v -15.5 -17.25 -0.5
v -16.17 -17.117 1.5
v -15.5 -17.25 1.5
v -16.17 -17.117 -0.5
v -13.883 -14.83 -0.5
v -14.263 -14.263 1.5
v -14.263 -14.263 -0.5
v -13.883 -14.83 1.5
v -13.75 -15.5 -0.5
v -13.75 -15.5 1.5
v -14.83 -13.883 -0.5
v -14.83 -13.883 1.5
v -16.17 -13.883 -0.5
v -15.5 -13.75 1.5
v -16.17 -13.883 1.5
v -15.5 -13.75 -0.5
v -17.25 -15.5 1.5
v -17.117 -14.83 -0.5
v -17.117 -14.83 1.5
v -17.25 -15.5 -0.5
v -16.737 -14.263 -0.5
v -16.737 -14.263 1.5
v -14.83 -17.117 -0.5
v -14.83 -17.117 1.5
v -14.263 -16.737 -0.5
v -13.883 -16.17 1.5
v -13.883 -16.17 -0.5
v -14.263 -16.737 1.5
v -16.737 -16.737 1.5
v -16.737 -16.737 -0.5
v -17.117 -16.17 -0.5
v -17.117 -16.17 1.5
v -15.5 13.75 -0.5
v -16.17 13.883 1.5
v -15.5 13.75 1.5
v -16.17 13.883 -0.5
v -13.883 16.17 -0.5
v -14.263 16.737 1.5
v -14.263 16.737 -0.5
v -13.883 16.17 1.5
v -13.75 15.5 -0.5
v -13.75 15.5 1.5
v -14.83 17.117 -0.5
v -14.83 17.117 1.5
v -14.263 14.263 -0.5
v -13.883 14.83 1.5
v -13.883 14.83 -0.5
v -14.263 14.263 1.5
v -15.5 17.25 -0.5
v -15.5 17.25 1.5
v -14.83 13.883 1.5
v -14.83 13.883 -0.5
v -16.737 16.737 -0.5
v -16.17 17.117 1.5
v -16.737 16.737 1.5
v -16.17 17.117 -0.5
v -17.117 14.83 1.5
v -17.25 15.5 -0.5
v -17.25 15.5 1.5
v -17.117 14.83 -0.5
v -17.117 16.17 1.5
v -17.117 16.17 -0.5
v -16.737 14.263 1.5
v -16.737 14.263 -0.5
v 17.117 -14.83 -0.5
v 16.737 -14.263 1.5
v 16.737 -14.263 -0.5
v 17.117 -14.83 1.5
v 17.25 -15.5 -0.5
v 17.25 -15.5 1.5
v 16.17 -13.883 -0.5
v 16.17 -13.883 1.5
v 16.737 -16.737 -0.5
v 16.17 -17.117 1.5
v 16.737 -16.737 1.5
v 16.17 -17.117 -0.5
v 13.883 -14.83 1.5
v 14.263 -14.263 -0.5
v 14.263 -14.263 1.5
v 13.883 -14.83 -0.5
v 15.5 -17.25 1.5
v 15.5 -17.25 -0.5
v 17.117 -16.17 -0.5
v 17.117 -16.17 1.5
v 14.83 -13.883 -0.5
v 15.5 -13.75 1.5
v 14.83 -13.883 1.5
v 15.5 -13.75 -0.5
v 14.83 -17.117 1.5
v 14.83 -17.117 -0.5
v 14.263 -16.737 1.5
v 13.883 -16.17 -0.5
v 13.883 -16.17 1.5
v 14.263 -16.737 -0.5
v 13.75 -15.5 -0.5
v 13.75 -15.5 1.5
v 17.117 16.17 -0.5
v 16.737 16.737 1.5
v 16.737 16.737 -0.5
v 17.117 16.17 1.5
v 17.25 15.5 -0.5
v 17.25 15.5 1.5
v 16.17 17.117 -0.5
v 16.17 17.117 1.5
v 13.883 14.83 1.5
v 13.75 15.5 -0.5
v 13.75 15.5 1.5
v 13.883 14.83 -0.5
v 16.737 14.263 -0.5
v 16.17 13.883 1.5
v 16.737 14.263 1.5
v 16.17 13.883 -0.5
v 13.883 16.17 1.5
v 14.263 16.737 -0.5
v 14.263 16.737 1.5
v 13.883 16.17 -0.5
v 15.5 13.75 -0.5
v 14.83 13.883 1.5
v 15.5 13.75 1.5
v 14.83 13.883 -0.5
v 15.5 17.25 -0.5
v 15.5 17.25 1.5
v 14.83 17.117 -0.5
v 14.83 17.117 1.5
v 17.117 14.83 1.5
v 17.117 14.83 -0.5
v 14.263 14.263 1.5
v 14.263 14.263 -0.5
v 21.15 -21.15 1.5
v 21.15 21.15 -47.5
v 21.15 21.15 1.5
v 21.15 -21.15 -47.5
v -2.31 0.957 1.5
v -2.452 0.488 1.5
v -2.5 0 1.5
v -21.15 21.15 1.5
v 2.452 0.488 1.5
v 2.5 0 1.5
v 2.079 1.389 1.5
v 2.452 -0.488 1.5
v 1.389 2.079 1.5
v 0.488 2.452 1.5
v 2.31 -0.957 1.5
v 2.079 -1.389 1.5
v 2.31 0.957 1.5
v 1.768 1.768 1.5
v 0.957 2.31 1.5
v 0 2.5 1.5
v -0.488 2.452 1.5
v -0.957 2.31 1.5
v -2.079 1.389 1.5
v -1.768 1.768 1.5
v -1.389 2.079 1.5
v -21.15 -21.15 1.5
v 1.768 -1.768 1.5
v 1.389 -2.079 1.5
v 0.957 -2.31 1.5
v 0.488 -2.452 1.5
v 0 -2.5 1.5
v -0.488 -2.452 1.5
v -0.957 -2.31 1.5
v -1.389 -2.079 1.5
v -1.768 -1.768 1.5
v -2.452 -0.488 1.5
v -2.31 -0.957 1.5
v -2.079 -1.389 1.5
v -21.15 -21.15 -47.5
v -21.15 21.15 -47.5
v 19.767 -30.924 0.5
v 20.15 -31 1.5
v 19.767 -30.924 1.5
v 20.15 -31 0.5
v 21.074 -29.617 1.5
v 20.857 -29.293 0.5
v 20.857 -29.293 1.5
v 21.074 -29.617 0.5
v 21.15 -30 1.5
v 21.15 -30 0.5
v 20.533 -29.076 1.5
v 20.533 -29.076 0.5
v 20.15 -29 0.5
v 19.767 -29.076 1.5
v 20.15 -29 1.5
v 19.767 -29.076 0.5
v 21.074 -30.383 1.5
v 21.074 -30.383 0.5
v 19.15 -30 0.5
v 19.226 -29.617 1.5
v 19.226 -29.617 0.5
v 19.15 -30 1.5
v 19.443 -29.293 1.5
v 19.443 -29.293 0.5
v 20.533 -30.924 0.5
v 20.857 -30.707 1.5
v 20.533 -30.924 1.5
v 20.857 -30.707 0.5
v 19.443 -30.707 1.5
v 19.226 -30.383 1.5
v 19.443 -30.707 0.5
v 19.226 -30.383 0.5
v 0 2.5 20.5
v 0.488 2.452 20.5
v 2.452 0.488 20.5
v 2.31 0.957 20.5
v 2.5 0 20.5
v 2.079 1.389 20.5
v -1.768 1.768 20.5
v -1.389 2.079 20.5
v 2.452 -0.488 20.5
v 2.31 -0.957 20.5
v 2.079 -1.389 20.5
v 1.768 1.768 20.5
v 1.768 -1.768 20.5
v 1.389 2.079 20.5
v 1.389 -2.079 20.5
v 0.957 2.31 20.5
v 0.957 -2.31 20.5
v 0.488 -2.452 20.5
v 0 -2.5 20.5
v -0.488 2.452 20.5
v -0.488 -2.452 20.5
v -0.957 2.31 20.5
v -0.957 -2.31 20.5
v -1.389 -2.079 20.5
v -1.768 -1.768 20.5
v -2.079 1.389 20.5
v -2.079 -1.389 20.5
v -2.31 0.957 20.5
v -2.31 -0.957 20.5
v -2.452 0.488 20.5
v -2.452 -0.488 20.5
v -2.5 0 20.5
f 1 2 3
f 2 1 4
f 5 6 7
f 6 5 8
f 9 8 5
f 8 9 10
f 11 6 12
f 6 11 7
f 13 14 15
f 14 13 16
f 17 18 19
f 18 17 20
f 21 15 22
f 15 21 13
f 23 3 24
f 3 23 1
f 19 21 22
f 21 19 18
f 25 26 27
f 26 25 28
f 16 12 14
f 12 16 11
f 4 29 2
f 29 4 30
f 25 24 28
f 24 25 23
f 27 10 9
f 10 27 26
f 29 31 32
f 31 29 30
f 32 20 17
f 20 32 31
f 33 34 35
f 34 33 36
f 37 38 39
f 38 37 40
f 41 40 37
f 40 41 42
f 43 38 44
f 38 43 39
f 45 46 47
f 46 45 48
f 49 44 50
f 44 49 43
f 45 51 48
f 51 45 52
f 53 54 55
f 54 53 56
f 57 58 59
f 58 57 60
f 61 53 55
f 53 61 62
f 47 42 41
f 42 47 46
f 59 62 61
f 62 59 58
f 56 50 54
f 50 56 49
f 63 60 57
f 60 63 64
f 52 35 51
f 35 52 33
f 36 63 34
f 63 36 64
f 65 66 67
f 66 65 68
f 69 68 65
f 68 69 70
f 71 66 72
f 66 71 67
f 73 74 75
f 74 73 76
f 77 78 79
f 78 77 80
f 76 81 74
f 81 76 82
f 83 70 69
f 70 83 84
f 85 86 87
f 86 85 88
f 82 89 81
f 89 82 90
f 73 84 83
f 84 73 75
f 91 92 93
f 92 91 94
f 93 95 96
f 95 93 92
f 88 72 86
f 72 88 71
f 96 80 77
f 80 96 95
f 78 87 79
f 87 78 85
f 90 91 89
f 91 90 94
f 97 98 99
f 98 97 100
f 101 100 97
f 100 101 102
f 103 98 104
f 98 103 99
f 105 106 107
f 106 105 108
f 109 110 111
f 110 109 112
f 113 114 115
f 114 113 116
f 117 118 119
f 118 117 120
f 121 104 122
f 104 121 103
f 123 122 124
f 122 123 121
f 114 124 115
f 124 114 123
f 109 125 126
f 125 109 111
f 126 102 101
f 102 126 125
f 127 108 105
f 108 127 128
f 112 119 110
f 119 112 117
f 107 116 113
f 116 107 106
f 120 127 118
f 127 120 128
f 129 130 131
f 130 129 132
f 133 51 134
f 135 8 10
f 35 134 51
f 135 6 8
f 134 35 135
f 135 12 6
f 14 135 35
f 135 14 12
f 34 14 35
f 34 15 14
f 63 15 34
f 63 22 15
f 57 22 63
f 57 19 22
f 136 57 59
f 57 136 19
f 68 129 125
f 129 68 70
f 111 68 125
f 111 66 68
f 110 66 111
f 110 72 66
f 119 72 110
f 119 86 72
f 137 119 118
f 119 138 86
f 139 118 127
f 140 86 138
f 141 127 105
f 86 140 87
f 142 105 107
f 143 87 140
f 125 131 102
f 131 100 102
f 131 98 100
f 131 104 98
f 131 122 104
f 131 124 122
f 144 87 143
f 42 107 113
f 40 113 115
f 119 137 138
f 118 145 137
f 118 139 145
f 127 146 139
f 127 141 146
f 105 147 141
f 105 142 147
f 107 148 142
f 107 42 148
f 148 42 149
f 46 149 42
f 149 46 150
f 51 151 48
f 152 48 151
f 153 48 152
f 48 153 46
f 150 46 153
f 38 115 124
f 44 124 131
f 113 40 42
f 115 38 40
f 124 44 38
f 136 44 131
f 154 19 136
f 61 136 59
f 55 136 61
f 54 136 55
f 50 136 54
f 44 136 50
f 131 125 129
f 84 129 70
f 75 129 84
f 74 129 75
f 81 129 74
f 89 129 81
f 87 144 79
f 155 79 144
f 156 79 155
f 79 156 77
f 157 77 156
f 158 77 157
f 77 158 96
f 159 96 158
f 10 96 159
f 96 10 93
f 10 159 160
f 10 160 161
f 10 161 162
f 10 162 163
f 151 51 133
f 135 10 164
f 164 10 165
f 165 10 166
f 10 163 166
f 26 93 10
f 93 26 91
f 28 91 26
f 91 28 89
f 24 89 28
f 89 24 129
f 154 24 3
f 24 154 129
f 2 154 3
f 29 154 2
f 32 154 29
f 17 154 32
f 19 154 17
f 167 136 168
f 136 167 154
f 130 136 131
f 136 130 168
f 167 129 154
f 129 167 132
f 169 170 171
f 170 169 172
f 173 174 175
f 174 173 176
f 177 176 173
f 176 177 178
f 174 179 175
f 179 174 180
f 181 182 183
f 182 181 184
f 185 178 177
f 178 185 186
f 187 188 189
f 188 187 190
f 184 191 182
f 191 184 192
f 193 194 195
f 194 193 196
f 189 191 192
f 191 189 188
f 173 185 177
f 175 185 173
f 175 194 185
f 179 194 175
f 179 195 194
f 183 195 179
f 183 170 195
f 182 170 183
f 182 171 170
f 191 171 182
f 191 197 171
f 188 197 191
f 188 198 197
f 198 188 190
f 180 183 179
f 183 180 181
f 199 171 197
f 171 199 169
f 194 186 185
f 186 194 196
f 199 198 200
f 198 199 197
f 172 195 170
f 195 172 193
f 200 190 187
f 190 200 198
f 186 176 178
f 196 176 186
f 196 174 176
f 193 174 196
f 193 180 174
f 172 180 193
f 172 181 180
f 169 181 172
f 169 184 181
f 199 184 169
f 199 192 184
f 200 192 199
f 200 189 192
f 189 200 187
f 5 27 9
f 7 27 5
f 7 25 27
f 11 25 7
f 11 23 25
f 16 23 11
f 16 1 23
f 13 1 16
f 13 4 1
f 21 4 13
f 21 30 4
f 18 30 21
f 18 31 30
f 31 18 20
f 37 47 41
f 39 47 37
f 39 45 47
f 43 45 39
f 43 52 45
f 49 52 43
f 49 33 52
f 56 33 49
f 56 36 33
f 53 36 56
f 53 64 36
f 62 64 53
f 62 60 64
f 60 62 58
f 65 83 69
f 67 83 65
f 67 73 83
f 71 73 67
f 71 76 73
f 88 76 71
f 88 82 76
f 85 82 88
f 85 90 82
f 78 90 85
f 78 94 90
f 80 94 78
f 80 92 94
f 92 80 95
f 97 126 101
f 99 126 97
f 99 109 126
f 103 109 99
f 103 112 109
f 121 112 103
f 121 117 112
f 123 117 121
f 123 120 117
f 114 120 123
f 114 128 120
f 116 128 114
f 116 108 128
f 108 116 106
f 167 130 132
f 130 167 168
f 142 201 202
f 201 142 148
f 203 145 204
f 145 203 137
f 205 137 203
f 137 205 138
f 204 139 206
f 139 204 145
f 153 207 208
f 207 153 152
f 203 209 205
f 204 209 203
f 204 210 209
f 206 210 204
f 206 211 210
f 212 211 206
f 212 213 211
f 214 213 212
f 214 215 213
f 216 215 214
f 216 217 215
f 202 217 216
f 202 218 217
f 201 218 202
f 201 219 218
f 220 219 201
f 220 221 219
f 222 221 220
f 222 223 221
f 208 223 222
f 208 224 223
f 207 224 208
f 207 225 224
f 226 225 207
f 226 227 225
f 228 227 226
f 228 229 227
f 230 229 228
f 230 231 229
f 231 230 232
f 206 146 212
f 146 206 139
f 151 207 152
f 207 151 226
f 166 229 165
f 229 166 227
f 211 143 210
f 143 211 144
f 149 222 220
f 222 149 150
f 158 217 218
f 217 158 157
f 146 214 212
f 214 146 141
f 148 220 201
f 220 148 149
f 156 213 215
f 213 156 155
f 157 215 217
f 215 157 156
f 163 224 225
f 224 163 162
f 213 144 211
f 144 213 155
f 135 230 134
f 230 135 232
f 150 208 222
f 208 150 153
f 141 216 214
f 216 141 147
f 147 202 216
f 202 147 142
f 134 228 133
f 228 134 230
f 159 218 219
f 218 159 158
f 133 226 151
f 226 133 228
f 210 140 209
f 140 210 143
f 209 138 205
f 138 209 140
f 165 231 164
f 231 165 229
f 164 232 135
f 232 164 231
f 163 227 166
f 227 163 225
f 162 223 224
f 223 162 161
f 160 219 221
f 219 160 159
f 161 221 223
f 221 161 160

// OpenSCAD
// Parameters
face_width = 42.3; //[21.15:84.6:0.1]
face_thickness = 3.0; //[1.5:6.0:0.1]
body_length = 47.0; //[23.5:94.0:0.1]
body_width = 42.3; //[21.15:84.6:0.1]
body_height = 42.3; //[21.15:84.6:0.1]
shaft_diameter = 5.0; //[2.5:10.0:0.1]
shaft_length = 20.0; //[10.0:40.0:0.1]
mount_hole_spacing = 31.0; //[15.5:62.0:0.1]
mount_hole_diameter = 3.5; //[2.0:6.0:0.1]
mount_hole_overcut = 1.0; //[0.5:3.0:0.1]
overlap = 1.0; //[0.5:2.0:0.1]
pattern_marker_diameter = 2.0; //[1.0:6.0:0.1]
pattern_marker_height = 1.0; //[0.5:5.0:0.1]
ttrack_length = 60.0; //[30.0:120.0:0.1]
ttrack_screw_pitch = 20.0; //[10.0:40.0:0.1]
ttrack_insert_hole_count = 3; //[1:10:1]
rail_hole_spacing = 25.0; //[12.5:50.0:0.1]
grill_hole_spacing = 8.0; //[4.0:16.0:0.1]

// Motor Shaft
module motor_shaft() {
  color("Silver") {
    translate([0, 0, face_thickness/2 + shaft_length/2 - overlap])
      cylinder(h=shaft_length, r=shaft_diameter/2, center=true, $fn=32);
  }
}

// Ttrack Hole Positions
module ttrack_hole_positions() {
  color("DimGray") {
    for (i = [1:ttrack_insert_hole_count]) {
      translate([face_width/2 - pattern_marker_diameter/2, 
                 ttrack_length/2 - (i * ttrack_screw_pitch), 
                 face_thickness/2 - pattern_marker_height/2])
        cylinder(h=pattern_marker_height, r=pattern_marker_diameter/2, center=true, $fn=16);
    }
  }
}

// Ttrack Insert Hole Positions
module ttrack_insert_hole_positions() {
  color("DimGray") {
    for (i = [1:ttrack_insert_hole_count]) {
      translate([(ttrack_length/2) - (i * ttrack_length/(ttrack_insert_hole_count+1)), 
                 -face_width/2 + pattern_marker_diameter/2, 
                 face_thickness/2 - pattern_marker_height/2])
        cylinder(h=pattern_marker_height, r=pattern_marker_diameter/2, center=true, $fn=16);
    }
  }
}

// Rail Hole Positions
module rail_hole_positions() {
  color("DimGray") {
    translate([-face_width/2 + pattern_marker_diameter/2, 
               rail_hole_spacing/2, 
               face_thickness/2 - pattern_marker_height/2])
      cylinder(h=pattern_marker_height, r=pattern_marker_diameter/2, center=true, $fn=16);
    translate([-face_width/2 + pattern_marker_diameter/2, 
               -rail_hole_spacing/2, 
               face_thickness/2 - pattern_marker_height/2])
      cylinder(h=pattern_marker_height, r=pattern_marker_diameter/2, center=true, $fn=16);
  }
}

// Grill Hole Positions
module grill_hole_positions() {
  color("DimGray") {
    for (x = [-1, 1])
      for (y = [-1, 1])
        translate([x * grill_hole_spacing/2, 
                   y * grill_hole_spacing/2, 
                   face_thickness/2 - pattern_marker_height/2])
          cylinder(h=pattern_marker_height, r=pattern_marker_diameter/2, center=true, $fn=16);
  }
}

// Motor Body
module motor_body() {
  color("Black") {
    translate([0, 0, -(face_thickness/2 + body_length/2 - overlap)])
      cube([body_width, body_height, body_length], center=true);
  }
}

// Front Face with Mount Holes
module front_face_with_mount_holes() {
  color("Black") {
    difference() {
      translate([0, 0, 0])
        cube([face_width, face_width, face_thickness], center=true);
      for (x = [-1, 1])
        for (y = [-1, 1])
          translate([x * mount_hole_spacing/2, y * mount_hole_spacing/2, 0])
            cylinder(h=face_thickness + mount_hole_overcut, r=mount_hole_diameter/2, center=true, $fn=16);
    }
  }
}

// Assembly
module assembly() {
  motor_body();
  front_face_with_mount_holes();
  motor_shaft();
  ttrack_hole_positions();
  ttrack_insert_hole_positions();
  rail_hole_positions();
  grill_hole_positions();
}

assembly();
